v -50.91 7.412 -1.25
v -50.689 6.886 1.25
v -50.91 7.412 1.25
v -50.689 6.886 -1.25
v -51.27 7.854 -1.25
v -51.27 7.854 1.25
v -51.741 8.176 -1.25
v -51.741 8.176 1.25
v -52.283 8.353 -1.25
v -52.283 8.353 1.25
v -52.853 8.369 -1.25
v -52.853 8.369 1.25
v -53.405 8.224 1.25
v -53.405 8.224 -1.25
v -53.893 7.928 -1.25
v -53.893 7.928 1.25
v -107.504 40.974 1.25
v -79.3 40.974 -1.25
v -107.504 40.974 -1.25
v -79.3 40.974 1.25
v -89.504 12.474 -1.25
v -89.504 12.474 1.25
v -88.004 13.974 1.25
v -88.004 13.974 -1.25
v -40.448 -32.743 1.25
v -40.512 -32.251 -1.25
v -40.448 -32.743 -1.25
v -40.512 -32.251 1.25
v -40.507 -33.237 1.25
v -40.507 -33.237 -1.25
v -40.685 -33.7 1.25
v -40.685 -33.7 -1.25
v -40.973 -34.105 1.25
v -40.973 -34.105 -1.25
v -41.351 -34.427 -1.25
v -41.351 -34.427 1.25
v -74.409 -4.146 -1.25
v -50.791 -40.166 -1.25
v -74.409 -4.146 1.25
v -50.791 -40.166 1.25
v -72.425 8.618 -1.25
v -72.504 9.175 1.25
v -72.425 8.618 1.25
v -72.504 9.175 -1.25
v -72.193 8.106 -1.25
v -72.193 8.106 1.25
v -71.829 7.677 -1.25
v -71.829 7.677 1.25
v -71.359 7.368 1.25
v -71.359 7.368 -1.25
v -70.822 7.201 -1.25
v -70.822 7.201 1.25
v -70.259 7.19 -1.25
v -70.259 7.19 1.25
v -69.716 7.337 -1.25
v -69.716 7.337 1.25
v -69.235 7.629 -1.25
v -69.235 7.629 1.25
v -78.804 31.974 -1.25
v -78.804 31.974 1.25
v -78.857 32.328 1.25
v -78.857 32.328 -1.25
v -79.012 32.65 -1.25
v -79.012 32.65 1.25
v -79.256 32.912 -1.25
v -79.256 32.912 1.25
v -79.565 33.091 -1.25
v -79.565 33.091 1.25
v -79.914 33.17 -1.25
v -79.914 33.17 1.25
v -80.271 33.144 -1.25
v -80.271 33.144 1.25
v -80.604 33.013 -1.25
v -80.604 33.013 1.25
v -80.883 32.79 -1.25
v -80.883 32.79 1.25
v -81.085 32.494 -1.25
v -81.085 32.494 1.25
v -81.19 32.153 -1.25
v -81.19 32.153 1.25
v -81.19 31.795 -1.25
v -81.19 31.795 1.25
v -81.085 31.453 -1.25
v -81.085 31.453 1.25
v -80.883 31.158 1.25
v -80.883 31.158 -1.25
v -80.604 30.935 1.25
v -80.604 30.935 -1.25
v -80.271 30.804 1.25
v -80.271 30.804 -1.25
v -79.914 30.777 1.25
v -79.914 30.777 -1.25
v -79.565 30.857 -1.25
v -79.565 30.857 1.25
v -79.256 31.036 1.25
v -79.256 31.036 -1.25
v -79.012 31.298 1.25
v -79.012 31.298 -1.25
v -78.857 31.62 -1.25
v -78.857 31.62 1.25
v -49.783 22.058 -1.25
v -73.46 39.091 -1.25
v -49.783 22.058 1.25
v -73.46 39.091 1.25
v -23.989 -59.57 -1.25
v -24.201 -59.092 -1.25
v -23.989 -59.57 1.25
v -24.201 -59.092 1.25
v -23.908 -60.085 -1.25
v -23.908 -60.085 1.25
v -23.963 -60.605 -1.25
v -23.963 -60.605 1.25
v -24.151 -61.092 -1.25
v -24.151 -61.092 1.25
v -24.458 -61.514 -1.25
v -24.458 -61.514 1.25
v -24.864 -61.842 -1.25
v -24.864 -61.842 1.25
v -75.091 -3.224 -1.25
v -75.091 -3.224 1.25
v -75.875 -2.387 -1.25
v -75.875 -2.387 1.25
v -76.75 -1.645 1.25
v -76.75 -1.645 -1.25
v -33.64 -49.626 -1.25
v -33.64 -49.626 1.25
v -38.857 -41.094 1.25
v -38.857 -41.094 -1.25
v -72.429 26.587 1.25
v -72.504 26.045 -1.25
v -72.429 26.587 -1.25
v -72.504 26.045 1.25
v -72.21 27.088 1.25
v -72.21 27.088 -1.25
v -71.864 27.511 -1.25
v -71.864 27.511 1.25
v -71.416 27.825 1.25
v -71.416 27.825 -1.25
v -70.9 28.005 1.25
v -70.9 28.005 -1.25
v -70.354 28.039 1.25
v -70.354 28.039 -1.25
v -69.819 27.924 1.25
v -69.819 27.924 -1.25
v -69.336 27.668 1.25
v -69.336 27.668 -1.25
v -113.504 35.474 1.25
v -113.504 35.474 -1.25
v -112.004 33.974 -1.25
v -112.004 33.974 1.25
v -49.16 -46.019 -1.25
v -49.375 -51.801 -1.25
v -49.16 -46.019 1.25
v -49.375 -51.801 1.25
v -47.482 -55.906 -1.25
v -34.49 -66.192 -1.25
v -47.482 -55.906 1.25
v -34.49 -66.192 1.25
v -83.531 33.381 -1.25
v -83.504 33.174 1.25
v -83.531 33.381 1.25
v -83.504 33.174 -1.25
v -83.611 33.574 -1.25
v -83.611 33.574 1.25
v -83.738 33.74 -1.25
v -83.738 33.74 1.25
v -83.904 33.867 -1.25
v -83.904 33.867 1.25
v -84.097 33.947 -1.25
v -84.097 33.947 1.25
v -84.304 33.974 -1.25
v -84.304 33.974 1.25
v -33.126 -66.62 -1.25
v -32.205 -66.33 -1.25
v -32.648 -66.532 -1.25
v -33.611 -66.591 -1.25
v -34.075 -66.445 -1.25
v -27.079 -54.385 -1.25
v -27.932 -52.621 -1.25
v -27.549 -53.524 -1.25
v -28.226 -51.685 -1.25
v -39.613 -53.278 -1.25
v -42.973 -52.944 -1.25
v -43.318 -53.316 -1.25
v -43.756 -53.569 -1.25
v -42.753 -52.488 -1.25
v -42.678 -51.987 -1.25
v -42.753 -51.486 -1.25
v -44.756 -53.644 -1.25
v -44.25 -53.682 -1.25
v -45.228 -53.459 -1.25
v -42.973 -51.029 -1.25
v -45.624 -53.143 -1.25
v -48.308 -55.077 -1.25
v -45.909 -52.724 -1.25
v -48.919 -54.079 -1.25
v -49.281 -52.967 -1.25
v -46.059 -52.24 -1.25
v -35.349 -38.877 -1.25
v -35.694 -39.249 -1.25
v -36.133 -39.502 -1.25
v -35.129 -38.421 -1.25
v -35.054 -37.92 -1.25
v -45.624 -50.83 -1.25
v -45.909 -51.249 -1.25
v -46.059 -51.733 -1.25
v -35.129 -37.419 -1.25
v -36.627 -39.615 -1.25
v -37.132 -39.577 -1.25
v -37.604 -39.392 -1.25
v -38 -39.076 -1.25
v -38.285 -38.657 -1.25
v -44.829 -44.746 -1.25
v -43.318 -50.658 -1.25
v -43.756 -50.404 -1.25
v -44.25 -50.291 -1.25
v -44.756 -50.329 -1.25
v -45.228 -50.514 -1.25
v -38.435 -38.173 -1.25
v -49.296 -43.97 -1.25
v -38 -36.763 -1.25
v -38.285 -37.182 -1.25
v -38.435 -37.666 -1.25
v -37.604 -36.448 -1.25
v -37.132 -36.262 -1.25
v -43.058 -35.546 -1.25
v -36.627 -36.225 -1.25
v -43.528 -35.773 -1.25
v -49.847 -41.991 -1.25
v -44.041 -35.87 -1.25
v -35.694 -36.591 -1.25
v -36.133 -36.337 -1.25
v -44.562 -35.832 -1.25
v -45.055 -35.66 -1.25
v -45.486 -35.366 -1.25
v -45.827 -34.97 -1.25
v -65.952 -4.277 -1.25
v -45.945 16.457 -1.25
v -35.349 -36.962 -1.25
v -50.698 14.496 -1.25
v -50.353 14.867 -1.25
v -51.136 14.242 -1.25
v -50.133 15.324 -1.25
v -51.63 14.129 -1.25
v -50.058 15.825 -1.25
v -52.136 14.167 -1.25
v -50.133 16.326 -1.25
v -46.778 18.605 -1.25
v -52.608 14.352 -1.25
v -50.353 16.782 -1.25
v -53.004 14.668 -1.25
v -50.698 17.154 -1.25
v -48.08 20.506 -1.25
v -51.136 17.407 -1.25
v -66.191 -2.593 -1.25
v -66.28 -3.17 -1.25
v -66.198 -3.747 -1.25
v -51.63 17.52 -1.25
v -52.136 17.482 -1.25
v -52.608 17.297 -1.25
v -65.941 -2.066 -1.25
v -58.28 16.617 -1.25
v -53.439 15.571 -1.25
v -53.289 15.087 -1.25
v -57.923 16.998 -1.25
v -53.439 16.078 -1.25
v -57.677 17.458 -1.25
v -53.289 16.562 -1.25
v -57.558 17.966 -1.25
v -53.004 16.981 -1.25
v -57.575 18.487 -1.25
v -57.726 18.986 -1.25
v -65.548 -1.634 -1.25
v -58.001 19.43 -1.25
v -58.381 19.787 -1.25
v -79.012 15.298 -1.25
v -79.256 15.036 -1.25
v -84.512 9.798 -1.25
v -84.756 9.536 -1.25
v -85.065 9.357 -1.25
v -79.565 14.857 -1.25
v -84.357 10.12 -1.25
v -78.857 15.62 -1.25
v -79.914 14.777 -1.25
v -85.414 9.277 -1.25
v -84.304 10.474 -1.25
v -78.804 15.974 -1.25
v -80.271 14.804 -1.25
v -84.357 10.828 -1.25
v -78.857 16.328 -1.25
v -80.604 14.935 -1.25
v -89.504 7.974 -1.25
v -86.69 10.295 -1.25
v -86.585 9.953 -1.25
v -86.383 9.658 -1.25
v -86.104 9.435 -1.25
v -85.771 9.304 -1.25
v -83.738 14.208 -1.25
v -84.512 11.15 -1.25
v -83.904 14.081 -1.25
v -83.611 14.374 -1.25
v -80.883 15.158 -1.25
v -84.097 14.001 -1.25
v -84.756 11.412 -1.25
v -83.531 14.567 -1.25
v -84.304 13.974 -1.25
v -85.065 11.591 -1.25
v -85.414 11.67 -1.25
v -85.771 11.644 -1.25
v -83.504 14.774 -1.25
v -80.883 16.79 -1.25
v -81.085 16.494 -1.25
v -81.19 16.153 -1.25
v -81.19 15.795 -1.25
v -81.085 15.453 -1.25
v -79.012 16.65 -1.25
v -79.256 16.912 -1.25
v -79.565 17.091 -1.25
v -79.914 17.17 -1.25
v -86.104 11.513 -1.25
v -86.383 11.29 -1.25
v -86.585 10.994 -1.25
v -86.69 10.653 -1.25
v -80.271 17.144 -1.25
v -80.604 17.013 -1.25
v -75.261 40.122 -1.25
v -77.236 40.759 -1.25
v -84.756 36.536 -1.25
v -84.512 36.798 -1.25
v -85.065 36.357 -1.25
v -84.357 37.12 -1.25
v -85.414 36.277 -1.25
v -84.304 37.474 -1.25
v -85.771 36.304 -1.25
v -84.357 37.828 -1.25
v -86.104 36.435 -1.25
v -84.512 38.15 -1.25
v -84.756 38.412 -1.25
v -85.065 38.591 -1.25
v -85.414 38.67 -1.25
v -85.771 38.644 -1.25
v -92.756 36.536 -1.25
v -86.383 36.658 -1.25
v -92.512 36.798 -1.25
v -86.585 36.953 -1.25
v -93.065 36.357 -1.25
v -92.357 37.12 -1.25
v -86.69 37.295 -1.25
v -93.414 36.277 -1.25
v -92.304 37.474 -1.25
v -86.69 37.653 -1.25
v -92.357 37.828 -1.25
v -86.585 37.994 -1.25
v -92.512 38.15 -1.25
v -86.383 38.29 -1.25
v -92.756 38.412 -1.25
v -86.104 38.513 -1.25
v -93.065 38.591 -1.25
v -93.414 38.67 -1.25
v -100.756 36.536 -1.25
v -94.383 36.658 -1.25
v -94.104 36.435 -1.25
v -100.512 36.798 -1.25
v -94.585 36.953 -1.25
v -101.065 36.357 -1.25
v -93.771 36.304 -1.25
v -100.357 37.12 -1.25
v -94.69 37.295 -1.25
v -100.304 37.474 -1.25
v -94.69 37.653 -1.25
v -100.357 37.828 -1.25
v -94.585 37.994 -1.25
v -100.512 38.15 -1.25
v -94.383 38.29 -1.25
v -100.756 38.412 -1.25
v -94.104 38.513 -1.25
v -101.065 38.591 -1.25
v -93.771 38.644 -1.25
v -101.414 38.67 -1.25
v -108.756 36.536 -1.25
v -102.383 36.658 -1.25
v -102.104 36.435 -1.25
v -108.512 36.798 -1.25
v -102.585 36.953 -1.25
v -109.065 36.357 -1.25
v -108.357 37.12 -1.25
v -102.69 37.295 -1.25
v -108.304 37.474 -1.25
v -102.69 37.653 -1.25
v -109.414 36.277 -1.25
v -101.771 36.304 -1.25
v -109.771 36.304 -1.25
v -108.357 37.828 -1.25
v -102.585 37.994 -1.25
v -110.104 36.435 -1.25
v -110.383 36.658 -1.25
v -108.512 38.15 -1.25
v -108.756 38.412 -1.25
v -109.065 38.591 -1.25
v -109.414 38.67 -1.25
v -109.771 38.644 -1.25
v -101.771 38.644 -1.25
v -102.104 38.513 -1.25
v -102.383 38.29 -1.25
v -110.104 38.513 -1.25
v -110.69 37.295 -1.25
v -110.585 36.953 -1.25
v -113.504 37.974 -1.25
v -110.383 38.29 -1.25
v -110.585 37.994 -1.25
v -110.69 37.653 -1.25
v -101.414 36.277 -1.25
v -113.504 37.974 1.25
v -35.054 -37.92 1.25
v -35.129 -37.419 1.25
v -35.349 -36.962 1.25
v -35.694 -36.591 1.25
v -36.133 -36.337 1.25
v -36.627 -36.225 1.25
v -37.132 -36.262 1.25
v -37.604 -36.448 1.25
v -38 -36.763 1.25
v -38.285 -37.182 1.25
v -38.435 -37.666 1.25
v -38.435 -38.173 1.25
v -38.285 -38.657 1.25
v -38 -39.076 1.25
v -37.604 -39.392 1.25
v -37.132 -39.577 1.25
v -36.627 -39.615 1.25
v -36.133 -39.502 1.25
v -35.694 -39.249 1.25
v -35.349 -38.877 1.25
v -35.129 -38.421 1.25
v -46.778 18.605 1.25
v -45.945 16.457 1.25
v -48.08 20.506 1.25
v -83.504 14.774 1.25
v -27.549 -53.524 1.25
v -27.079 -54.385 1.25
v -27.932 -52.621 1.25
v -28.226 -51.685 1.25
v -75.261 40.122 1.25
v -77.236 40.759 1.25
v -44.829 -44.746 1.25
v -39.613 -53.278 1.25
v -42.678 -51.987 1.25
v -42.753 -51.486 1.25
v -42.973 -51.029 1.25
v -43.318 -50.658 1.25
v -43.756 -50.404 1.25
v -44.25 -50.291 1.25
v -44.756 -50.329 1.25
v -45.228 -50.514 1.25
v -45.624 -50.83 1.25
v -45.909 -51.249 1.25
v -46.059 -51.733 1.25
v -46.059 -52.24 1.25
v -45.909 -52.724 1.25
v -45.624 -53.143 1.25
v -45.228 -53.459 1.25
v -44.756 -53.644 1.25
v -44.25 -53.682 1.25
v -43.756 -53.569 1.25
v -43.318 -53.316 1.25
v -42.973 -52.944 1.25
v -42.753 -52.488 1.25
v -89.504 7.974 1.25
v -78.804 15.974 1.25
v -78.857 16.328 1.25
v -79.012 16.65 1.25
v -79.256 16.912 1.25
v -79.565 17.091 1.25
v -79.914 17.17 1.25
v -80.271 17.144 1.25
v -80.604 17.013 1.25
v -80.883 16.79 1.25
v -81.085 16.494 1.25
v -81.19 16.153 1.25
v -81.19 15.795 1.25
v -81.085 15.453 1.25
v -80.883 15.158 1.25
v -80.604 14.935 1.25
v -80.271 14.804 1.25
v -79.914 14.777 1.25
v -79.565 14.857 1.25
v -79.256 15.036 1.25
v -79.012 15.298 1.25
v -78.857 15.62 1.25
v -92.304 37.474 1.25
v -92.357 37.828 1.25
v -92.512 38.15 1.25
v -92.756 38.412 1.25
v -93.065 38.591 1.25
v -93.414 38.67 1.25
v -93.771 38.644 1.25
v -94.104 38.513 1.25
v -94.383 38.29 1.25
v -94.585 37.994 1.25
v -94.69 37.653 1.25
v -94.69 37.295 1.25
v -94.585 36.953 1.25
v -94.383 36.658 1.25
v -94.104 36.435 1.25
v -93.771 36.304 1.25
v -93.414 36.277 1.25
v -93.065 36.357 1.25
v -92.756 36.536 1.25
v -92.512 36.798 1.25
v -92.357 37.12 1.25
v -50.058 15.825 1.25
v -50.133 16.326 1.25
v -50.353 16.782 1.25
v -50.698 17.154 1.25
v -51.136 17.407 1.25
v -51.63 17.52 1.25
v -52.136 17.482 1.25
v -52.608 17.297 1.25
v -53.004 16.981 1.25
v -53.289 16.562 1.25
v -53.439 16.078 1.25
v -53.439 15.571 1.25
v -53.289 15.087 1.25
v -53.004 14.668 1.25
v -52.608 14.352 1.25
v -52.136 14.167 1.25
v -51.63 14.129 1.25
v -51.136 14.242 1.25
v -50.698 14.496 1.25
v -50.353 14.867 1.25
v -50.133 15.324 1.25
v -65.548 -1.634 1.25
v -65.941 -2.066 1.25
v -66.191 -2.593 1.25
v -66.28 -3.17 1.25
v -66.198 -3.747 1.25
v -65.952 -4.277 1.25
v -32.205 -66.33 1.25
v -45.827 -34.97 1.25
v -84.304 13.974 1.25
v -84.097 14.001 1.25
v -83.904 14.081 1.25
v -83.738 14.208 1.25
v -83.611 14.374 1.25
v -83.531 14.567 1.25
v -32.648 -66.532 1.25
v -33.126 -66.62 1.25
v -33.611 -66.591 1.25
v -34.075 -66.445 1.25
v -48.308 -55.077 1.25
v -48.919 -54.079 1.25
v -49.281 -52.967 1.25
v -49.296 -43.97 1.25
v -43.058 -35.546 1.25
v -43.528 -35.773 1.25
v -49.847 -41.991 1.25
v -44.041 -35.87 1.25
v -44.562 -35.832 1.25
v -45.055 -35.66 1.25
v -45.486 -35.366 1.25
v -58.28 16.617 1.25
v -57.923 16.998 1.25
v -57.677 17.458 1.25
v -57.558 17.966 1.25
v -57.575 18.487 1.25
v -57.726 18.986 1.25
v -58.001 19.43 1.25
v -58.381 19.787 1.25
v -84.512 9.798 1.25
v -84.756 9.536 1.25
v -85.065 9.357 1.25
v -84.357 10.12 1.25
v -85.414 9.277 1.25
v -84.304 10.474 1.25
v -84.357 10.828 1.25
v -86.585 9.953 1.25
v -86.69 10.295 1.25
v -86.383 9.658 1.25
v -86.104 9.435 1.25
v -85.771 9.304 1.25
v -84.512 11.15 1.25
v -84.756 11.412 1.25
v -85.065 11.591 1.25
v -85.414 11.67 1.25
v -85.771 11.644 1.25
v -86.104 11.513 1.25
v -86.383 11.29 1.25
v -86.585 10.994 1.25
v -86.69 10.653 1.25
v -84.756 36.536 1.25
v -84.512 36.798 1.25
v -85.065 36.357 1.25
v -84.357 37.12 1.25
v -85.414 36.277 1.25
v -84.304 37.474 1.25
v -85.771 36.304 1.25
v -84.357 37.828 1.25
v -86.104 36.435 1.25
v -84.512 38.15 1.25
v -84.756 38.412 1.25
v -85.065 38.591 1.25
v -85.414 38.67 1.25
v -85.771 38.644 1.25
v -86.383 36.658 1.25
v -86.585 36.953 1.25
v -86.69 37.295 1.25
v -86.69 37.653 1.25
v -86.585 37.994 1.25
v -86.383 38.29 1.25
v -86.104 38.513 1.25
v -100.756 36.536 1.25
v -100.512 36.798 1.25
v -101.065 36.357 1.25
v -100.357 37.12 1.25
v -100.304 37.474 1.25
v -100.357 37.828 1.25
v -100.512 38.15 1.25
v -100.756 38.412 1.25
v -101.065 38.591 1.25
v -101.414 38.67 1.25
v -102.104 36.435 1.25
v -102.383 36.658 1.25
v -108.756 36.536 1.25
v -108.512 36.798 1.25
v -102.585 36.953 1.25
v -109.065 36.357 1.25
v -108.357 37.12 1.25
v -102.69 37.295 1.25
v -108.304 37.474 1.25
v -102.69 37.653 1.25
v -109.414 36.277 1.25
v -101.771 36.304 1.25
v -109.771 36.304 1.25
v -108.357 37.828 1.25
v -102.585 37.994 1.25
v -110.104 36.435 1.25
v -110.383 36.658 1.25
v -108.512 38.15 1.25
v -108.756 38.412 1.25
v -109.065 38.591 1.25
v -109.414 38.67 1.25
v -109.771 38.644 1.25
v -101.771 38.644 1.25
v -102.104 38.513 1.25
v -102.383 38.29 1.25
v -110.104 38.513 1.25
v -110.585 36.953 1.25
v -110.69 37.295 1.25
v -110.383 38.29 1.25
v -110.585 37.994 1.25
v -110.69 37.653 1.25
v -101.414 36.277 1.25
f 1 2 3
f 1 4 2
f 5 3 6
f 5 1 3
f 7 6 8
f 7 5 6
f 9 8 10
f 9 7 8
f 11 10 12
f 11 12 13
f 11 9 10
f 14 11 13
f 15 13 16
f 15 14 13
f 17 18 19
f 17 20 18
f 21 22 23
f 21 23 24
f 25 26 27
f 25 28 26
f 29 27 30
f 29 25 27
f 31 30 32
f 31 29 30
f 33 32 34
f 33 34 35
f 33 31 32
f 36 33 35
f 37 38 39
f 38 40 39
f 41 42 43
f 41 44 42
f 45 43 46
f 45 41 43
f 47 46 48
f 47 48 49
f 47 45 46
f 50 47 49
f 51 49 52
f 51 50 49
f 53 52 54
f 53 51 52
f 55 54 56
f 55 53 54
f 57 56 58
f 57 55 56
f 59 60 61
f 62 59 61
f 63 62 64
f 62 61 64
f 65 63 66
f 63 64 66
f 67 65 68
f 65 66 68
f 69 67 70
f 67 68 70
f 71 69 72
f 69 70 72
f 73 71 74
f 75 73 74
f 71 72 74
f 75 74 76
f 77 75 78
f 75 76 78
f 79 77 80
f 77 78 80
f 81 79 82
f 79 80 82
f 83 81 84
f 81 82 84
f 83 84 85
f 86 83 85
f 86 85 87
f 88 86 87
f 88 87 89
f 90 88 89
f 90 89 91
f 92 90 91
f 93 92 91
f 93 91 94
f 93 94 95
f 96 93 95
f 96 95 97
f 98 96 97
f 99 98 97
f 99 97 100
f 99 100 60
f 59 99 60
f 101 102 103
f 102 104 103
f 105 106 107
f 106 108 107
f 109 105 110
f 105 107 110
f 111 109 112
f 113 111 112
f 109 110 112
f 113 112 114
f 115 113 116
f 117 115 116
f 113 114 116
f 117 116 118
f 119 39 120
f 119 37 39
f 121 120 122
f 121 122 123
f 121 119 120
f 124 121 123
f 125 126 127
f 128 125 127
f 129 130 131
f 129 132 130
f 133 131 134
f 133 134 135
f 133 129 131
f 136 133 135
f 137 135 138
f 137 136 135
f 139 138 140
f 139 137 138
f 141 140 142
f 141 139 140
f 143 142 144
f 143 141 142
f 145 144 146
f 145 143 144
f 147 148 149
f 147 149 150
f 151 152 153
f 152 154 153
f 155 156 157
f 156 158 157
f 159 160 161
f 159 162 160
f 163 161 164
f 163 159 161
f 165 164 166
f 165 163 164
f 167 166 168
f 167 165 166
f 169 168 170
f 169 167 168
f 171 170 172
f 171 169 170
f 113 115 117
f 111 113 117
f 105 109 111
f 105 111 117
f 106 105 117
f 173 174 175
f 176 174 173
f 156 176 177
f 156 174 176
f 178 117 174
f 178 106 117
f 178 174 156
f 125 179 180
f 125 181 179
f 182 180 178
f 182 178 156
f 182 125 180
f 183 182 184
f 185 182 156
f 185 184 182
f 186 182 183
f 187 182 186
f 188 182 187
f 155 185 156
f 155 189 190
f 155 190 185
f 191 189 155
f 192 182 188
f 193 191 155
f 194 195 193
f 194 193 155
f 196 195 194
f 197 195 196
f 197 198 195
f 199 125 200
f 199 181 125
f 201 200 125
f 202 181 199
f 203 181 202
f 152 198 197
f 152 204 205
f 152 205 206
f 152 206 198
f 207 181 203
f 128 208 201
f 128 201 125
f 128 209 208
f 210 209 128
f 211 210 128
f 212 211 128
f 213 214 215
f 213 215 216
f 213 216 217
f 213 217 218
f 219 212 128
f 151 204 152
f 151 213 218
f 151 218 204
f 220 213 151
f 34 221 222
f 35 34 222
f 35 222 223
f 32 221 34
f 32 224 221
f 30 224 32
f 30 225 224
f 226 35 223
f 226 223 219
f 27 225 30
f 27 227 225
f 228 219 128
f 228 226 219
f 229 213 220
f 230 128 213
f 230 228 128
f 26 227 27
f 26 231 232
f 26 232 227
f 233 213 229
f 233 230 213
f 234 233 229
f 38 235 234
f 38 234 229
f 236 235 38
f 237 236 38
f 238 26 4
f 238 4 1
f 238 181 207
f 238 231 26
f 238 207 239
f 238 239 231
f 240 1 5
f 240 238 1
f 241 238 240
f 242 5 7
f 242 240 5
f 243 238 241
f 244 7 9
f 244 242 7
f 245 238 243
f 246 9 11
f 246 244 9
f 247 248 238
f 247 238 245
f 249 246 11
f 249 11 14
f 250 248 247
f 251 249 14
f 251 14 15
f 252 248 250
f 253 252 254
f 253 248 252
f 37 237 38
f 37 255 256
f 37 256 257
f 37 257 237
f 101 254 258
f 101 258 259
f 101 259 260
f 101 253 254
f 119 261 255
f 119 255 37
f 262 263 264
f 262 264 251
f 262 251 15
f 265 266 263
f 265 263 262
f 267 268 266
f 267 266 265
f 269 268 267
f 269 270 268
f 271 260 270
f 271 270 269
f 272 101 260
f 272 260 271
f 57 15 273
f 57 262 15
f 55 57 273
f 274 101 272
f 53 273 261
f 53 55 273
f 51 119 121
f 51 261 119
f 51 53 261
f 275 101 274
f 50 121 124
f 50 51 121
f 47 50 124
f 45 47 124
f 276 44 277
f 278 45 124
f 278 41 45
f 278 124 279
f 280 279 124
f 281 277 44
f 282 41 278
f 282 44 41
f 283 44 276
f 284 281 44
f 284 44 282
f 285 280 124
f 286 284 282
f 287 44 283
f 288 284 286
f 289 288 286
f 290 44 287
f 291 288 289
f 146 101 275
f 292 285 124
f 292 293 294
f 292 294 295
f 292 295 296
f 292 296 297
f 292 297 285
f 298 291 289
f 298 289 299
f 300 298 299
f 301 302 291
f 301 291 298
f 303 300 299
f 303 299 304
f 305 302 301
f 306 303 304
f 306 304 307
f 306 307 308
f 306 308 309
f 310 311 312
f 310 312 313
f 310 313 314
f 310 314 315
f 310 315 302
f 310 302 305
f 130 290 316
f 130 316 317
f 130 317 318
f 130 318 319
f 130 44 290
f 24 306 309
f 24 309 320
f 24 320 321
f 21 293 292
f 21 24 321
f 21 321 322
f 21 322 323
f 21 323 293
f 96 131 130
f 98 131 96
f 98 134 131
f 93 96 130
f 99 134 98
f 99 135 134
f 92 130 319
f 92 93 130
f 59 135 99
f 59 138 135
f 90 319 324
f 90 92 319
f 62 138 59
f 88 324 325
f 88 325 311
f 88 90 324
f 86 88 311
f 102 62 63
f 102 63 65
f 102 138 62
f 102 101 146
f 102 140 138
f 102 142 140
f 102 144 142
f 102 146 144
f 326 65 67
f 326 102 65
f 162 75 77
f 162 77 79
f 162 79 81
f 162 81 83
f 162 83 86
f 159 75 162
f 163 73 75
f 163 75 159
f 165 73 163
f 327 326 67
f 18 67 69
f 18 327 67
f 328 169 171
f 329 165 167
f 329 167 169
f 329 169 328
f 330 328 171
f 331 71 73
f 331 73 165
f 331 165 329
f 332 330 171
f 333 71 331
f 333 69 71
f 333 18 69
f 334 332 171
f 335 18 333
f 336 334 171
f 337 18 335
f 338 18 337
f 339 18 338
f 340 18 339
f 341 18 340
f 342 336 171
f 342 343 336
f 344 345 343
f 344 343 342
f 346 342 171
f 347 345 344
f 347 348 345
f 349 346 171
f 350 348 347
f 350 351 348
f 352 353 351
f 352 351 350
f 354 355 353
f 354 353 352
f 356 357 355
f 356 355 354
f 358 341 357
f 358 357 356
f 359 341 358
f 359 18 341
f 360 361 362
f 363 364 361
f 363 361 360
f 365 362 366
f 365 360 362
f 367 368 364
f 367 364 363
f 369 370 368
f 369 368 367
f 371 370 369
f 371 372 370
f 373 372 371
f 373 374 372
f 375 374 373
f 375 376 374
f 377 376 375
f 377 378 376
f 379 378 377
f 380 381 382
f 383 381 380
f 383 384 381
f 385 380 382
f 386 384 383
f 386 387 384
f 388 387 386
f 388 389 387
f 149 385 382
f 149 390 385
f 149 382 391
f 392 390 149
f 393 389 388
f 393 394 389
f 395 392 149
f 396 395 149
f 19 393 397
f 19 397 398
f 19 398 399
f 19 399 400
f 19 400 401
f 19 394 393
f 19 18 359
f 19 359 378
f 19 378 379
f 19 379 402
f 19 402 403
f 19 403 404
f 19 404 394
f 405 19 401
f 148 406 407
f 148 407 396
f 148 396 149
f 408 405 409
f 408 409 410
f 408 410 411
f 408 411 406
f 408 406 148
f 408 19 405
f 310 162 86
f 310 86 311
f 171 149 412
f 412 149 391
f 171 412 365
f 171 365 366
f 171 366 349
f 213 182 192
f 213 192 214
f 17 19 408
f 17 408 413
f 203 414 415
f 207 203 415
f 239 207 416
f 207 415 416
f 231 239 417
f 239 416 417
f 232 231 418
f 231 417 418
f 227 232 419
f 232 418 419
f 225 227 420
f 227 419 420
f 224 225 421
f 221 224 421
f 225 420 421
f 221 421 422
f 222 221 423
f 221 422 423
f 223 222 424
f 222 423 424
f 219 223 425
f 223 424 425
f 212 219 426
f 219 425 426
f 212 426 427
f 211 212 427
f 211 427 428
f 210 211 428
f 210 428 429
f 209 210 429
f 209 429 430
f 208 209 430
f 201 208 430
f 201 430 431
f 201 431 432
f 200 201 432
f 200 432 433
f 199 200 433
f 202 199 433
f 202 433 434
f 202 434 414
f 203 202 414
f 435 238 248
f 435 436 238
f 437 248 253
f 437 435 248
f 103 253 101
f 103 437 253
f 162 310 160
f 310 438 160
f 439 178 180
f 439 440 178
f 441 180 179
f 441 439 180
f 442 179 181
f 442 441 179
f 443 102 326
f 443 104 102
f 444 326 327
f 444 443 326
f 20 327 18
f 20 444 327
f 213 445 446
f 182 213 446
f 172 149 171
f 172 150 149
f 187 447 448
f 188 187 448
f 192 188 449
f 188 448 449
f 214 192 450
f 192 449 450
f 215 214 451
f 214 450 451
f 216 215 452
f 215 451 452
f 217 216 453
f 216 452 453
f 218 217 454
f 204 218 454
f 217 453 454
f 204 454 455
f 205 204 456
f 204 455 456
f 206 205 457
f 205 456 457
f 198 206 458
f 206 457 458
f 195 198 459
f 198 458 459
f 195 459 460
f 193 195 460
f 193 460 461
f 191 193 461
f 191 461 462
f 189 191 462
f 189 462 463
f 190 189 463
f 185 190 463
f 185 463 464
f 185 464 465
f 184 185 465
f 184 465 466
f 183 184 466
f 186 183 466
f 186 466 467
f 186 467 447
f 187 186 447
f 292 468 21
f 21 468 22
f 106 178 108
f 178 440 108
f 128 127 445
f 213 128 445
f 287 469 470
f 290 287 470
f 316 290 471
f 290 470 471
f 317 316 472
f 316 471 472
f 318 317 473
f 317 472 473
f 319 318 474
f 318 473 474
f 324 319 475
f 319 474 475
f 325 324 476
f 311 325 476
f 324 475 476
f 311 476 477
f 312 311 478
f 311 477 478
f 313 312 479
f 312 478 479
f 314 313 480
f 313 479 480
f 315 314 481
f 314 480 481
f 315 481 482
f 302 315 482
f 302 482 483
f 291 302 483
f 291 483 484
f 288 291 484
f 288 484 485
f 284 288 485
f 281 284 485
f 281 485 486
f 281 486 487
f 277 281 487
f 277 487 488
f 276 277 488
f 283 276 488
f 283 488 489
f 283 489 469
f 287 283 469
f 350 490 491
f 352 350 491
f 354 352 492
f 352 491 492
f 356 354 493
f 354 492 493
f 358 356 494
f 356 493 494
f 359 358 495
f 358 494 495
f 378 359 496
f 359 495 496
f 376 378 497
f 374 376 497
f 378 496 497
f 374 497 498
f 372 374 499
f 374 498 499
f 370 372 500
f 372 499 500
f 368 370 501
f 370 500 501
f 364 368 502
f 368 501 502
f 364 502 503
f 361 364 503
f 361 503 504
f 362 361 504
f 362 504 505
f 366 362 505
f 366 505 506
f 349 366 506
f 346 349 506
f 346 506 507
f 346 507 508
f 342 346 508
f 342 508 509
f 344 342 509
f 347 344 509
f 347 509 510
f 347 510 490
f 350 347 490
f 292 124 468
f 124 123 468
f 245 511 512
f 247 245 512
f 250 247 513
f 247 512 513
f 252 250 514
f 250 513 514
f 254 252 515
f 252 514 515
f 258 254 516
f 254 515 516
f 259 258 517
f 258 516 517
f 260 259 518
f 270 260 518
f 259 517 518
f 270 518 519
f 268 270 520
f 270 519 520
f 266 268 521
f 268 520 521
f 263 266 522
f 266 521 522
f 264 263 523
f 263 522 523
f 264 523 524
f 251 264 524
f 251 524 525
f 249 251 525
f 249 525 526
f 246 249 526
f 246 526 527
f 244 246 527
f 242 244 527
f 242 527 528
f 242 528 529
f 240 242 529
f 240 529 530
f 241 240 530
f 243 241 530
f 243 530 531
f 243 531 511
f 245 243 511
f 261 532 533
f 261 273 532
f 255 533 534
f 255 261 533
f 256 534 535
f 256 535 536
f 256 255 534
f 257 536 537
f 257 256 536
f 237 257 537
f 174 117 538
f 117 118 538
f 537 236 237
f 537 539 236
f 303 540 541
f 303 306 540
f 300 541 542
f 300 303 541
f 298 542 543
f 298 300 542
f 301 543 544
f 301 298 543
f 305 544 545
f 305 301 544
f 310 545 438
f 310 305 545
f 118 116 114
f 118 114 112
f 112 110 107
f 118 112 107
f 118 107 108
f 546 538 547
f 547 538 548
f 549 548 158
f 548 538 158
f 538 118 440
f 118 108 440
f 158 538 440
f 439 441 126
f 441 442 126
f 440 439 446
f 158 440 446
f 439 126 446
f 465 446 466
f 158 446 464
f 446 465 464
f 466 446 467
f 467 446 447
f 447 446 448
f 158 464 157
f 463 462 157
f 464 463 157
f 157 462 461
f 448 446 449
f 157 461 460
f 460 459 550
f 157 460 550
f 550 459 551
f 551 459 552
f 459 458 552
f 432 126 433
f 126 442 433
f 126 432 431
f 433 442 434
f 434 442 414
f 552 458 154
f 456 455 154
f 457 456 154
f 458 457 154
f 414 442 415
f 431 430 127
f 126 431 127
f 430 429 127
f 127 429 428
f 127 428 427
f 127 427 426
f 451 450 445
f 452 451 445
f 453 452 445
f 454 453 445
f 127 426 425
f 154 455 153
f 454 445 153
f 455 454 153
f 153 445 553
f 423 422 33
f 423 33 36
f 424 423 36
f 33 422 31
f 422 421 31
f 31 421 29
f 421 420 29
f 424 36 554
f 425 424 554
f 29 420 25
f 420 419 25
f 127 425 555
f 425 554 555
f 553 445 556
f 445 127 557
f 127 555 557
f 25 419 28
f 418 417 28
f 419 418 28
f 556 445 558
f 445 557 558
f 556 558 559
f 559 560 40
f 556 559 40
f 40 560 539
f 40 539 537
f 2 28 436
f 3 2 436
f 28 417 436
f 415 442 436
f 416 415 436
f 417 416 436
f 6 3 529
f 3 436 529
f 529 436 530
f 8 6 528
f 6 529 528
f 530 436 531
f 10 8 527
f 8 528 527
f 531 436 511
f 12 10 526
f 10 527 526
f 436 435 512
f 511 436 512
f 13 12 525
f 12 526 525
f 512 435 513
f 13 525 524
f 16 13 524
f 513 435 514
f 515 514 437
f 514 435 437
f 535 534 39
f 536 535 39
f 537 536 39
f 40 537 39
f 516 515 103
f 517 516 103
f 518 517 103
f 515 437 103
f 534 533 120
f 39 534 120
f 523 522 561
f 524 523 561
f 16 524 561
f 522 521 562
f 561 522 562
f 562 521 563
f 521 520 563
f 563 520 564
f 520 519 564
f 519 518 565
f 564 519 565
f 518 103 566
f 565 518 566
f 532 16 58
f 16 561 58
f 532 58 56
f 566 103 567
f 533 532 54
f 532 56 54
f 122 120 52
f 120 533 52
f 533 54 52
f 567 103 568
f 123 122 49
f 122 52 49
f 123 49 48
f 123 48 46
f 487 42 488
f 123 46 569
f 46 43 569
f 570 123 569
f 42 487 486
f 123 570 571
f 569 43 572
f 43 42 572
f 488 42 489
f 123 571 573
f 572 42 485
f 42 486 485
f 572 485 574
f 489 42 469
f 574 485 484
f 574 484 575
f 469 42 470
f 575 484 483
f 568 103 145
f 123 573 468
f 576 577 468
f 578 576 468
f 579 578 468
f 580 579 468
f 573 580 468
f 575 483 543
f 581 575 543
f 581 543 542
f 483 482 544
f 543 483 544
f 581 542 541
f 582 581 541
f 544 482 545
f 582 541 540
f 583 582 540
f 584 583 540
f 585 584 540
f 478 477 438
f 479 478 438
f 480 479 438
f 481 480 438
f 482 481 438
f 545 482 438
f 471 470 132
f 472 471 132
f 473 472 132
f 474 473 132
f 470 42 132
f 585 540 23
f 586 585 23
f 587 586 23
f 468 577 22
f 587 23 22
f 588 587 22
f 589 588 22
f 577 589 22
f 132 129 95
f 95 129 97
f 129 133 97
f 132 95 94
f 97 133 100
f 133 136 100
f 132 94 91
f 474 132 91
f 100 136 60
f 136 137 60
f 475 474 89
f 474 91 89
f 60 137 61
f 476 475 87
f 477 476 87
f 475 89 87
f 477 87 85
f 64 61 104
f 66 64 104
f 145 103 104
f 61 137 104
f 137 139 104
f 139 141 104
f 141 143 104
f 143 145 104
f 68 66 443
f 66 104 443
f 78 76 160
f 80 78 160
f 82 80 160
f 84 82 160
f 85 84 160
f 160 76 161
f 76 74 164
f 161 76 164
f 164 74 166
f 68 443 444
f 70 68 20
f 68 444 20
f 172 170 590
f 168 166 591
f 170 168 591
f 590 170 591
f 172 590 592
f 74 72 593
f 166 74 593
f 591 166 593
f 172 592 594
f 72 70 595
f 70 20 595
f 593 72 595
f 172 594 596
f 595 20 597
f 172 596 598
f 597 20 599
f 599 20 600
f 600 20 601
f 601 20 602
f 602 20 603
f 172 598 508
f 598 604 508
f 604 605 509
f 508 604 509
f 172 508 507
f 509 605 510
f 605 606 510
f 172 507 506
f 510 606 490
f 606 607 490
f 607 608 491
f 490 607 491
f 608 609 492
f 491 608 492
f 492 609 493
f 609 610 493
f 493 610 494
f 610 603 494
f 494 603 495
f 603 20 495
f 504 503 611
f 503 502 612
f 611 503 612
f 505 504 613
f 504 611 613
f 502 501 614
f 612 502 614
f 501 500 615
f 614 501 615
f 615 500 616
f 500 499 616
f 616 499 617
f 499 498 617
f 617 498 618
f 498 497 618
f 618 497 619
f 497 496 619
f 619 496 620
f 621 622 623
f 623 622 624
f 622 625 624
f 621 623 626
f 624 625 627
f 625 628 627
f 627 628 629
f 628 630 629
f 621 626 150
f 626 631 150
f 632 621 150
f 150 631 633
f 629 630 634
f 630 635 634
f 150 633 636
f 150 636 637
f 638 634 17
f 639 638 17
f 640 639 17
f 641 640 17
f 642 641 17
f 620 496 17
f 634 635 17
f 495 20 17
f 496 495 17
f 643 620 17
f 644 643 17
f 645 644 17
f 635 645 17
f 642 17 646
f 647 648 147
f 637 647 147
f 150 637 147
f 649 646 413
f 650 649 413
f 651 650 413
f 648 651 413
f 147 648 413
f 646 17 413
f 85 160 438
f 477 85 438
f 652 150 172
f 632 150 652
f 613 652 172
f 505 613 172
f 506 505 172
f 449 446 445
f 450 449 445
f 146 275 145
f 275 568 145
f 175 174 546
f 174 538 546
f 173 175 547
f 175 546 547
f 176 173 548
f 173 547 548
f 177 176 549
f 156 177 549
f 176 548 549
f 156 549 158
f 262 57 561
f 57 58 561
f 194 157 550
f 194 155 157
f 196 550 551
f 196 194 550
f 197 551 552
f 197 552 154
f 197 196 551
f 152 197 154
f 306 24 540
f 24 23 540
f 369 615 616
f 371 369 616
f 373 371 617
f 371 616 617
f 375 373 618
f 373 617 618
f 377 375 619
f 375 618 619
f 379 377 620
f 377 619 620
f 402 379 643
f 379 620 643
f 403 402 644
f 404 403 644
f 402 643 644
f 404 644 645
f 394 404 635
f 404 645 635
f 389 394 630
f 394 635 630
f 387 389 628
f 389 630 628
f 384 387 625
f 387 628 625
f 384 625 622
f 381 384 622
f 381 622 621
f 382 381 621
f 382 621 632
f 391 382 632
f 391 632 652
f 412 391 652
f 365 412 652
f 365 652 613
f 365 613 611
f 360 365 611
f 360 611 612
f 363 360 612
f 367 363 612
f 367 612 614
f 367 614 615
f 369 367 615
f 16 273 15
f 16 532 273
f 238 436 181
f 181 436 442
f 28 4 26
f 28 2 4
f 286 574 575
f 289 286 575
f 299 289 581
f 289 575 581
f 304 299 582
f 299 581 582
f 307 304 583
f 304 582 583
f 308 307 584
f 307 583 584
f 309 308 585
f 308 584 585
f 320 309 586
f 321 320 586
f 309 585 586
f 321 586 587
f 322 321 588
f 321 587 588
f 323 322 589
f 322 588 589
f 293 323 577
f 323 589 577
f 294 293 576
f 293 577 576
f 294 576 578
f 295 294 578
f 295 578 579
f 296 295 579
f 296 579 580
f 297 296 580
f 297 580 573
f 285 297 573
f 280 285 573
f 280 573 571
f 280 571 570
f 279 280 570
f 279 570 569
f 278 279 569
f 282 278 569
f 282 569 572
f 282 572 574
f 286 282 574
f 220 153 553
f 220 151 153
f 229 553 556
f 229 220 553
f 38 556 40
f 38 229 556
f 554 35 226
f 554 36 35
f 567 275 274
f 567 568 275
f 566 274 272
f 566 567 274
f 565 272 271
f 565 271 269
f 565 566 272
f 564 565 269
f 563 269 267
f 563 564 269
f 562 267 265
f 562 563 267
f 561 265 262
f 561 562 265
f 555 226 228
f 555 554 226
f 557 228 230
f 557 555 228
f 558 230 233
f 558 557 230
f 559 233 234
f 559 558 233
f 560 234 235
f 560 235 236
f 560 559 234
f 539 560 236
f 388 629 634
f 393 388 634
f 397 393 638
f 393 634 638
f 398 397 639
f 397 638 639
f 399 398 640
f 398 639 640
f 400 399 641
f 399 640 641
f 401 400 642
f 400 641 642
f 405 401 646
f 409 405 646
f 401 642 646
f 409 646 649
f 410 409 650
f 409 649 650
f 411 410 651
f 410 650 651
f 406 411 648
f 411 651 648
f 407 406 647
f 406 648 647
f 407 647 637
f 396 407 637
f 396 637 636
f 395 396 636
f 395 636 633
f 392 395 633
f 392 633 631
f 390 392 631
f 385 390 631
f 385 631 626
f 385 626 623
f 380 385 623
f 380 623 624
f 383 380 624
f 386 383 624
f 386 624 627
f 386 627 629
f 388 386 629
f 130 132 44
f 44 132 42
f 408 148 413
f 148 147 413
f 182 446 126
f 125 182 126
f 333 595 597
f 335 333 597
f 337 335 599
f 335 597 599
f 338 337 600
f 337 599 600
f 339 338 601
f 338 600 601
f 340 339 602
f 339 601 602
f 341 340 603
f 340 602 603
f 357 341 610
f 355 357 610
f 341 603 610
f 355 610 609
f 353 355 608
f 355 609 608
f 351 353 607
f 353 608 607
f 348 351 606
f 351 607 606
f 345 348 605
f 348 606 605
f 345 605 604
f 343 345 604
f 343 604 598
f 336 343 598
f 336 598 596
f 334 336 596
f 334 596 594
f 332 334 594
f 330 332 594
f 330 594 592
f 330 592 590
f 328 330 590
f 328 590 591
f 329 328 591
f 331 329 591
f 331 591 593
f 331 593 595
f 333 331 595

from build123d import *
from OCP.BRepFilletAPI import BRepFilletAPI_MakeFillet

# Parameters (mm, degrees)
SALIENTE_EXTRUIR1_DEPTH = 1.25
CHAFL_N1_SIZE           = 1.5
CHAFL_N2_SIZE           = 6
CHAFL_N2_SIZE2          = 3
REDONDEO1_R             = 2
REDONDEO2_R1            = 10
REDONDEO2_R2            = 5
REDONDEO3_R             = 0.8
CROQUIS6_R              = 1.2
CROQUIS6_R_2            = 1.7
CORTAR_EXTRUIR1_DEPTH   = 132.636209799


with BuildPart() as part:
    # Croquis5 → Saliente-Extruir1 (new, symmetric)
    with BuildSketch(Plane.XY):
        Polygon((-33.3960961, -67.058199354), (-49.468312924, -54.332876319), (-49.042492677, -42.832876319), (-75.361903804, -2.692016862), (-89.503725327, 7.973817187), (-89.503725327, 13.973817187), (-83.503725327, 13.973817187), (-83.503725327, 33.973817187), (-108.003725327, 33.973817187), (-113.503725327, 33.973817187), (-113.503725327, 40.973817187), (-83.503725327, 40.973817187), (-76.07625416, 40.973817187), (-46.8531225, 19.949817187), (-27.852472036, -53.120185426), (-23.157930014, -60.798809991), align=None)
        Polygon((-51.475681089, 9.911759166), (-40.150790084, -33.639898021), (-44.730652374, -36.642805286), (-66.937655512, -2.77395512), align=None, mode=Mode.SUBTRACT)
        Polygon((-72.503725327, 4.947596176), (-56.268652183, 18.267596176), (-72.503725327, 29.947596176), align=None, mode=Mode.SUBTRACT)
    extrude(amount=SALIENTE_EXTRUIR1_DEPTH, both=True)

    # Chaflán1
    chafl_n1_edges = [part.edges().sort_by_distance(p)[0] for p in [
        (-89.503725327, 13.973817187, 0),
        (-113.503725327, 33.973817187, 0),
    ]]
    chamfer(chafl_n1_edges, length=CHAFL_N1_SIZE)

    # Chaflán2
    chafl_n2_edges = [part.edges().sort_by_distance(p)[0] for p in [
        (-113.503725327, 40.973817187, 0),
    ]]
    chafl_n2_side = [part.faces().sort_by_distance(p)[0] for p in [
        (-94.789989743, 40.973817187, 0),
    ]]
    chamfer(chafl_n2_edges, length=CHAFL_N2_SIZE, length2=CHAFL_N2_SIZE2, reference=chafl_n2_side[0])

    # Redondeo1
    redondeo1_edges = [part.edges().sort_by_distance(p)[0] for p in [
        (-23.157930014, -60.798809991, 0),
        (-33.3960961, -67.058199354, 0),
        (-44.730652374, -36.642805286, 0),
        (-40.150790084, -33.639898021, 0),
        (-66.937655512, -2.77395512, 0),
        (-51.475681089, 9.911759166, 0),
        (-72.503725327, 4.947596176, 0),
        (-56.268652183, 18.267596176, 0),
        (-72.503725327, 29.947596176, 0),
    ]]
    fillet(redondeo1_edges, radius=REDONDEO1_R)

    # Redondeo2: one fillet with a radius per group of edges: ONE call of the kernel's fillet builder (fillet() takes one radius for all edges)
    redondeo2_edges_1 = [part.edges().sort_by_distance(p)[0] for p in [
        (-76.07625416, 40.973817187, 0),
        (-46.8531225, 19.949817187, 0),
        (-75.361903804, -2.692016862, 0),
        (-27.852472036, -53.120185426, 0),
        (-49.042492677, -42.832876319, 0),
    ]]
    redondeo2_edges_2 = [part.edges().sort_by_distance(p)[0] for p in [
        (-49.468312924, -54.332876319, 0),
    ]]
    redondeo2 = BRepFilletAPI_MakeFillet(part.part.solid().wrapped)
    for e in redondeo2_edges_1:
        redondeo2.Add(REDONDEO2_R1, e.wrapped)
    for e in redondeo2_edges_2:
        redondeo2.Add(REDONDEO2_R2, e.wrapped)
    add(Compound.cast(redondeo2.Shape()), mode=Mode.REPLACE)

    # Redondeo3
    redondeo3_edges = [part.edges().sort_by_distance(p)[0] for p in [
        (-83.503725327, 13.973817187, 0),
        (-83.503725327, 33.973817187, 0),
    ]]
    fillet(redondeo3_edges, radius=REDONDEO3_R)

    # Croquis6 → Cortar-Extruir1 (cut, through all)
    with BuildSketch(Plane.XY.offset(1.25)):
        with Locations((-80.003725327, 31.973817187)):
            Circle(CROQUIS6_R)
        with Locations((-80.003725327, 15.973817187)):
            Circle(CROQUIS6_R)
        with Locations((-85.503725327, 37.473817187)):
            Circle(CROQUIS6_R)
        with Locations((-93.503725327, 37.473817187)):
            Circle(CROQUIS6_R)
        with Locations((-101.503725327, 37.473817187)):
            Circle(CROQUIS6_R)
        with Locations((-109.503725327, 37.473817187)):
            Circle(CROQUIS6_R)
        with Locations((-85.503725327, 10.473817187)):
            Circle(CROQUIS6_R)
        with Locations((-51.75750024, 15.82464715)):
            Circle(CROQUIS6_R_2)
        with Locations((-36.753725327, -37.919792915)):
            Circle(CROQUIS6_R_2)
        with Locations((-44.377518673, -51.986696449)):
            Circle(CROQUIS6_R_2)
        Polygon((-39.612609009, -53.277564811), (-33.640345459, -49.626254349), (-38.856503262, -41.094449277), (-44.828766812, -44.745759739), align=None)
    extrude(amount=-CORTAR_EXTRUIR1_DEPTH, mode=Mode.SUBTRACT)


solid = part.part
